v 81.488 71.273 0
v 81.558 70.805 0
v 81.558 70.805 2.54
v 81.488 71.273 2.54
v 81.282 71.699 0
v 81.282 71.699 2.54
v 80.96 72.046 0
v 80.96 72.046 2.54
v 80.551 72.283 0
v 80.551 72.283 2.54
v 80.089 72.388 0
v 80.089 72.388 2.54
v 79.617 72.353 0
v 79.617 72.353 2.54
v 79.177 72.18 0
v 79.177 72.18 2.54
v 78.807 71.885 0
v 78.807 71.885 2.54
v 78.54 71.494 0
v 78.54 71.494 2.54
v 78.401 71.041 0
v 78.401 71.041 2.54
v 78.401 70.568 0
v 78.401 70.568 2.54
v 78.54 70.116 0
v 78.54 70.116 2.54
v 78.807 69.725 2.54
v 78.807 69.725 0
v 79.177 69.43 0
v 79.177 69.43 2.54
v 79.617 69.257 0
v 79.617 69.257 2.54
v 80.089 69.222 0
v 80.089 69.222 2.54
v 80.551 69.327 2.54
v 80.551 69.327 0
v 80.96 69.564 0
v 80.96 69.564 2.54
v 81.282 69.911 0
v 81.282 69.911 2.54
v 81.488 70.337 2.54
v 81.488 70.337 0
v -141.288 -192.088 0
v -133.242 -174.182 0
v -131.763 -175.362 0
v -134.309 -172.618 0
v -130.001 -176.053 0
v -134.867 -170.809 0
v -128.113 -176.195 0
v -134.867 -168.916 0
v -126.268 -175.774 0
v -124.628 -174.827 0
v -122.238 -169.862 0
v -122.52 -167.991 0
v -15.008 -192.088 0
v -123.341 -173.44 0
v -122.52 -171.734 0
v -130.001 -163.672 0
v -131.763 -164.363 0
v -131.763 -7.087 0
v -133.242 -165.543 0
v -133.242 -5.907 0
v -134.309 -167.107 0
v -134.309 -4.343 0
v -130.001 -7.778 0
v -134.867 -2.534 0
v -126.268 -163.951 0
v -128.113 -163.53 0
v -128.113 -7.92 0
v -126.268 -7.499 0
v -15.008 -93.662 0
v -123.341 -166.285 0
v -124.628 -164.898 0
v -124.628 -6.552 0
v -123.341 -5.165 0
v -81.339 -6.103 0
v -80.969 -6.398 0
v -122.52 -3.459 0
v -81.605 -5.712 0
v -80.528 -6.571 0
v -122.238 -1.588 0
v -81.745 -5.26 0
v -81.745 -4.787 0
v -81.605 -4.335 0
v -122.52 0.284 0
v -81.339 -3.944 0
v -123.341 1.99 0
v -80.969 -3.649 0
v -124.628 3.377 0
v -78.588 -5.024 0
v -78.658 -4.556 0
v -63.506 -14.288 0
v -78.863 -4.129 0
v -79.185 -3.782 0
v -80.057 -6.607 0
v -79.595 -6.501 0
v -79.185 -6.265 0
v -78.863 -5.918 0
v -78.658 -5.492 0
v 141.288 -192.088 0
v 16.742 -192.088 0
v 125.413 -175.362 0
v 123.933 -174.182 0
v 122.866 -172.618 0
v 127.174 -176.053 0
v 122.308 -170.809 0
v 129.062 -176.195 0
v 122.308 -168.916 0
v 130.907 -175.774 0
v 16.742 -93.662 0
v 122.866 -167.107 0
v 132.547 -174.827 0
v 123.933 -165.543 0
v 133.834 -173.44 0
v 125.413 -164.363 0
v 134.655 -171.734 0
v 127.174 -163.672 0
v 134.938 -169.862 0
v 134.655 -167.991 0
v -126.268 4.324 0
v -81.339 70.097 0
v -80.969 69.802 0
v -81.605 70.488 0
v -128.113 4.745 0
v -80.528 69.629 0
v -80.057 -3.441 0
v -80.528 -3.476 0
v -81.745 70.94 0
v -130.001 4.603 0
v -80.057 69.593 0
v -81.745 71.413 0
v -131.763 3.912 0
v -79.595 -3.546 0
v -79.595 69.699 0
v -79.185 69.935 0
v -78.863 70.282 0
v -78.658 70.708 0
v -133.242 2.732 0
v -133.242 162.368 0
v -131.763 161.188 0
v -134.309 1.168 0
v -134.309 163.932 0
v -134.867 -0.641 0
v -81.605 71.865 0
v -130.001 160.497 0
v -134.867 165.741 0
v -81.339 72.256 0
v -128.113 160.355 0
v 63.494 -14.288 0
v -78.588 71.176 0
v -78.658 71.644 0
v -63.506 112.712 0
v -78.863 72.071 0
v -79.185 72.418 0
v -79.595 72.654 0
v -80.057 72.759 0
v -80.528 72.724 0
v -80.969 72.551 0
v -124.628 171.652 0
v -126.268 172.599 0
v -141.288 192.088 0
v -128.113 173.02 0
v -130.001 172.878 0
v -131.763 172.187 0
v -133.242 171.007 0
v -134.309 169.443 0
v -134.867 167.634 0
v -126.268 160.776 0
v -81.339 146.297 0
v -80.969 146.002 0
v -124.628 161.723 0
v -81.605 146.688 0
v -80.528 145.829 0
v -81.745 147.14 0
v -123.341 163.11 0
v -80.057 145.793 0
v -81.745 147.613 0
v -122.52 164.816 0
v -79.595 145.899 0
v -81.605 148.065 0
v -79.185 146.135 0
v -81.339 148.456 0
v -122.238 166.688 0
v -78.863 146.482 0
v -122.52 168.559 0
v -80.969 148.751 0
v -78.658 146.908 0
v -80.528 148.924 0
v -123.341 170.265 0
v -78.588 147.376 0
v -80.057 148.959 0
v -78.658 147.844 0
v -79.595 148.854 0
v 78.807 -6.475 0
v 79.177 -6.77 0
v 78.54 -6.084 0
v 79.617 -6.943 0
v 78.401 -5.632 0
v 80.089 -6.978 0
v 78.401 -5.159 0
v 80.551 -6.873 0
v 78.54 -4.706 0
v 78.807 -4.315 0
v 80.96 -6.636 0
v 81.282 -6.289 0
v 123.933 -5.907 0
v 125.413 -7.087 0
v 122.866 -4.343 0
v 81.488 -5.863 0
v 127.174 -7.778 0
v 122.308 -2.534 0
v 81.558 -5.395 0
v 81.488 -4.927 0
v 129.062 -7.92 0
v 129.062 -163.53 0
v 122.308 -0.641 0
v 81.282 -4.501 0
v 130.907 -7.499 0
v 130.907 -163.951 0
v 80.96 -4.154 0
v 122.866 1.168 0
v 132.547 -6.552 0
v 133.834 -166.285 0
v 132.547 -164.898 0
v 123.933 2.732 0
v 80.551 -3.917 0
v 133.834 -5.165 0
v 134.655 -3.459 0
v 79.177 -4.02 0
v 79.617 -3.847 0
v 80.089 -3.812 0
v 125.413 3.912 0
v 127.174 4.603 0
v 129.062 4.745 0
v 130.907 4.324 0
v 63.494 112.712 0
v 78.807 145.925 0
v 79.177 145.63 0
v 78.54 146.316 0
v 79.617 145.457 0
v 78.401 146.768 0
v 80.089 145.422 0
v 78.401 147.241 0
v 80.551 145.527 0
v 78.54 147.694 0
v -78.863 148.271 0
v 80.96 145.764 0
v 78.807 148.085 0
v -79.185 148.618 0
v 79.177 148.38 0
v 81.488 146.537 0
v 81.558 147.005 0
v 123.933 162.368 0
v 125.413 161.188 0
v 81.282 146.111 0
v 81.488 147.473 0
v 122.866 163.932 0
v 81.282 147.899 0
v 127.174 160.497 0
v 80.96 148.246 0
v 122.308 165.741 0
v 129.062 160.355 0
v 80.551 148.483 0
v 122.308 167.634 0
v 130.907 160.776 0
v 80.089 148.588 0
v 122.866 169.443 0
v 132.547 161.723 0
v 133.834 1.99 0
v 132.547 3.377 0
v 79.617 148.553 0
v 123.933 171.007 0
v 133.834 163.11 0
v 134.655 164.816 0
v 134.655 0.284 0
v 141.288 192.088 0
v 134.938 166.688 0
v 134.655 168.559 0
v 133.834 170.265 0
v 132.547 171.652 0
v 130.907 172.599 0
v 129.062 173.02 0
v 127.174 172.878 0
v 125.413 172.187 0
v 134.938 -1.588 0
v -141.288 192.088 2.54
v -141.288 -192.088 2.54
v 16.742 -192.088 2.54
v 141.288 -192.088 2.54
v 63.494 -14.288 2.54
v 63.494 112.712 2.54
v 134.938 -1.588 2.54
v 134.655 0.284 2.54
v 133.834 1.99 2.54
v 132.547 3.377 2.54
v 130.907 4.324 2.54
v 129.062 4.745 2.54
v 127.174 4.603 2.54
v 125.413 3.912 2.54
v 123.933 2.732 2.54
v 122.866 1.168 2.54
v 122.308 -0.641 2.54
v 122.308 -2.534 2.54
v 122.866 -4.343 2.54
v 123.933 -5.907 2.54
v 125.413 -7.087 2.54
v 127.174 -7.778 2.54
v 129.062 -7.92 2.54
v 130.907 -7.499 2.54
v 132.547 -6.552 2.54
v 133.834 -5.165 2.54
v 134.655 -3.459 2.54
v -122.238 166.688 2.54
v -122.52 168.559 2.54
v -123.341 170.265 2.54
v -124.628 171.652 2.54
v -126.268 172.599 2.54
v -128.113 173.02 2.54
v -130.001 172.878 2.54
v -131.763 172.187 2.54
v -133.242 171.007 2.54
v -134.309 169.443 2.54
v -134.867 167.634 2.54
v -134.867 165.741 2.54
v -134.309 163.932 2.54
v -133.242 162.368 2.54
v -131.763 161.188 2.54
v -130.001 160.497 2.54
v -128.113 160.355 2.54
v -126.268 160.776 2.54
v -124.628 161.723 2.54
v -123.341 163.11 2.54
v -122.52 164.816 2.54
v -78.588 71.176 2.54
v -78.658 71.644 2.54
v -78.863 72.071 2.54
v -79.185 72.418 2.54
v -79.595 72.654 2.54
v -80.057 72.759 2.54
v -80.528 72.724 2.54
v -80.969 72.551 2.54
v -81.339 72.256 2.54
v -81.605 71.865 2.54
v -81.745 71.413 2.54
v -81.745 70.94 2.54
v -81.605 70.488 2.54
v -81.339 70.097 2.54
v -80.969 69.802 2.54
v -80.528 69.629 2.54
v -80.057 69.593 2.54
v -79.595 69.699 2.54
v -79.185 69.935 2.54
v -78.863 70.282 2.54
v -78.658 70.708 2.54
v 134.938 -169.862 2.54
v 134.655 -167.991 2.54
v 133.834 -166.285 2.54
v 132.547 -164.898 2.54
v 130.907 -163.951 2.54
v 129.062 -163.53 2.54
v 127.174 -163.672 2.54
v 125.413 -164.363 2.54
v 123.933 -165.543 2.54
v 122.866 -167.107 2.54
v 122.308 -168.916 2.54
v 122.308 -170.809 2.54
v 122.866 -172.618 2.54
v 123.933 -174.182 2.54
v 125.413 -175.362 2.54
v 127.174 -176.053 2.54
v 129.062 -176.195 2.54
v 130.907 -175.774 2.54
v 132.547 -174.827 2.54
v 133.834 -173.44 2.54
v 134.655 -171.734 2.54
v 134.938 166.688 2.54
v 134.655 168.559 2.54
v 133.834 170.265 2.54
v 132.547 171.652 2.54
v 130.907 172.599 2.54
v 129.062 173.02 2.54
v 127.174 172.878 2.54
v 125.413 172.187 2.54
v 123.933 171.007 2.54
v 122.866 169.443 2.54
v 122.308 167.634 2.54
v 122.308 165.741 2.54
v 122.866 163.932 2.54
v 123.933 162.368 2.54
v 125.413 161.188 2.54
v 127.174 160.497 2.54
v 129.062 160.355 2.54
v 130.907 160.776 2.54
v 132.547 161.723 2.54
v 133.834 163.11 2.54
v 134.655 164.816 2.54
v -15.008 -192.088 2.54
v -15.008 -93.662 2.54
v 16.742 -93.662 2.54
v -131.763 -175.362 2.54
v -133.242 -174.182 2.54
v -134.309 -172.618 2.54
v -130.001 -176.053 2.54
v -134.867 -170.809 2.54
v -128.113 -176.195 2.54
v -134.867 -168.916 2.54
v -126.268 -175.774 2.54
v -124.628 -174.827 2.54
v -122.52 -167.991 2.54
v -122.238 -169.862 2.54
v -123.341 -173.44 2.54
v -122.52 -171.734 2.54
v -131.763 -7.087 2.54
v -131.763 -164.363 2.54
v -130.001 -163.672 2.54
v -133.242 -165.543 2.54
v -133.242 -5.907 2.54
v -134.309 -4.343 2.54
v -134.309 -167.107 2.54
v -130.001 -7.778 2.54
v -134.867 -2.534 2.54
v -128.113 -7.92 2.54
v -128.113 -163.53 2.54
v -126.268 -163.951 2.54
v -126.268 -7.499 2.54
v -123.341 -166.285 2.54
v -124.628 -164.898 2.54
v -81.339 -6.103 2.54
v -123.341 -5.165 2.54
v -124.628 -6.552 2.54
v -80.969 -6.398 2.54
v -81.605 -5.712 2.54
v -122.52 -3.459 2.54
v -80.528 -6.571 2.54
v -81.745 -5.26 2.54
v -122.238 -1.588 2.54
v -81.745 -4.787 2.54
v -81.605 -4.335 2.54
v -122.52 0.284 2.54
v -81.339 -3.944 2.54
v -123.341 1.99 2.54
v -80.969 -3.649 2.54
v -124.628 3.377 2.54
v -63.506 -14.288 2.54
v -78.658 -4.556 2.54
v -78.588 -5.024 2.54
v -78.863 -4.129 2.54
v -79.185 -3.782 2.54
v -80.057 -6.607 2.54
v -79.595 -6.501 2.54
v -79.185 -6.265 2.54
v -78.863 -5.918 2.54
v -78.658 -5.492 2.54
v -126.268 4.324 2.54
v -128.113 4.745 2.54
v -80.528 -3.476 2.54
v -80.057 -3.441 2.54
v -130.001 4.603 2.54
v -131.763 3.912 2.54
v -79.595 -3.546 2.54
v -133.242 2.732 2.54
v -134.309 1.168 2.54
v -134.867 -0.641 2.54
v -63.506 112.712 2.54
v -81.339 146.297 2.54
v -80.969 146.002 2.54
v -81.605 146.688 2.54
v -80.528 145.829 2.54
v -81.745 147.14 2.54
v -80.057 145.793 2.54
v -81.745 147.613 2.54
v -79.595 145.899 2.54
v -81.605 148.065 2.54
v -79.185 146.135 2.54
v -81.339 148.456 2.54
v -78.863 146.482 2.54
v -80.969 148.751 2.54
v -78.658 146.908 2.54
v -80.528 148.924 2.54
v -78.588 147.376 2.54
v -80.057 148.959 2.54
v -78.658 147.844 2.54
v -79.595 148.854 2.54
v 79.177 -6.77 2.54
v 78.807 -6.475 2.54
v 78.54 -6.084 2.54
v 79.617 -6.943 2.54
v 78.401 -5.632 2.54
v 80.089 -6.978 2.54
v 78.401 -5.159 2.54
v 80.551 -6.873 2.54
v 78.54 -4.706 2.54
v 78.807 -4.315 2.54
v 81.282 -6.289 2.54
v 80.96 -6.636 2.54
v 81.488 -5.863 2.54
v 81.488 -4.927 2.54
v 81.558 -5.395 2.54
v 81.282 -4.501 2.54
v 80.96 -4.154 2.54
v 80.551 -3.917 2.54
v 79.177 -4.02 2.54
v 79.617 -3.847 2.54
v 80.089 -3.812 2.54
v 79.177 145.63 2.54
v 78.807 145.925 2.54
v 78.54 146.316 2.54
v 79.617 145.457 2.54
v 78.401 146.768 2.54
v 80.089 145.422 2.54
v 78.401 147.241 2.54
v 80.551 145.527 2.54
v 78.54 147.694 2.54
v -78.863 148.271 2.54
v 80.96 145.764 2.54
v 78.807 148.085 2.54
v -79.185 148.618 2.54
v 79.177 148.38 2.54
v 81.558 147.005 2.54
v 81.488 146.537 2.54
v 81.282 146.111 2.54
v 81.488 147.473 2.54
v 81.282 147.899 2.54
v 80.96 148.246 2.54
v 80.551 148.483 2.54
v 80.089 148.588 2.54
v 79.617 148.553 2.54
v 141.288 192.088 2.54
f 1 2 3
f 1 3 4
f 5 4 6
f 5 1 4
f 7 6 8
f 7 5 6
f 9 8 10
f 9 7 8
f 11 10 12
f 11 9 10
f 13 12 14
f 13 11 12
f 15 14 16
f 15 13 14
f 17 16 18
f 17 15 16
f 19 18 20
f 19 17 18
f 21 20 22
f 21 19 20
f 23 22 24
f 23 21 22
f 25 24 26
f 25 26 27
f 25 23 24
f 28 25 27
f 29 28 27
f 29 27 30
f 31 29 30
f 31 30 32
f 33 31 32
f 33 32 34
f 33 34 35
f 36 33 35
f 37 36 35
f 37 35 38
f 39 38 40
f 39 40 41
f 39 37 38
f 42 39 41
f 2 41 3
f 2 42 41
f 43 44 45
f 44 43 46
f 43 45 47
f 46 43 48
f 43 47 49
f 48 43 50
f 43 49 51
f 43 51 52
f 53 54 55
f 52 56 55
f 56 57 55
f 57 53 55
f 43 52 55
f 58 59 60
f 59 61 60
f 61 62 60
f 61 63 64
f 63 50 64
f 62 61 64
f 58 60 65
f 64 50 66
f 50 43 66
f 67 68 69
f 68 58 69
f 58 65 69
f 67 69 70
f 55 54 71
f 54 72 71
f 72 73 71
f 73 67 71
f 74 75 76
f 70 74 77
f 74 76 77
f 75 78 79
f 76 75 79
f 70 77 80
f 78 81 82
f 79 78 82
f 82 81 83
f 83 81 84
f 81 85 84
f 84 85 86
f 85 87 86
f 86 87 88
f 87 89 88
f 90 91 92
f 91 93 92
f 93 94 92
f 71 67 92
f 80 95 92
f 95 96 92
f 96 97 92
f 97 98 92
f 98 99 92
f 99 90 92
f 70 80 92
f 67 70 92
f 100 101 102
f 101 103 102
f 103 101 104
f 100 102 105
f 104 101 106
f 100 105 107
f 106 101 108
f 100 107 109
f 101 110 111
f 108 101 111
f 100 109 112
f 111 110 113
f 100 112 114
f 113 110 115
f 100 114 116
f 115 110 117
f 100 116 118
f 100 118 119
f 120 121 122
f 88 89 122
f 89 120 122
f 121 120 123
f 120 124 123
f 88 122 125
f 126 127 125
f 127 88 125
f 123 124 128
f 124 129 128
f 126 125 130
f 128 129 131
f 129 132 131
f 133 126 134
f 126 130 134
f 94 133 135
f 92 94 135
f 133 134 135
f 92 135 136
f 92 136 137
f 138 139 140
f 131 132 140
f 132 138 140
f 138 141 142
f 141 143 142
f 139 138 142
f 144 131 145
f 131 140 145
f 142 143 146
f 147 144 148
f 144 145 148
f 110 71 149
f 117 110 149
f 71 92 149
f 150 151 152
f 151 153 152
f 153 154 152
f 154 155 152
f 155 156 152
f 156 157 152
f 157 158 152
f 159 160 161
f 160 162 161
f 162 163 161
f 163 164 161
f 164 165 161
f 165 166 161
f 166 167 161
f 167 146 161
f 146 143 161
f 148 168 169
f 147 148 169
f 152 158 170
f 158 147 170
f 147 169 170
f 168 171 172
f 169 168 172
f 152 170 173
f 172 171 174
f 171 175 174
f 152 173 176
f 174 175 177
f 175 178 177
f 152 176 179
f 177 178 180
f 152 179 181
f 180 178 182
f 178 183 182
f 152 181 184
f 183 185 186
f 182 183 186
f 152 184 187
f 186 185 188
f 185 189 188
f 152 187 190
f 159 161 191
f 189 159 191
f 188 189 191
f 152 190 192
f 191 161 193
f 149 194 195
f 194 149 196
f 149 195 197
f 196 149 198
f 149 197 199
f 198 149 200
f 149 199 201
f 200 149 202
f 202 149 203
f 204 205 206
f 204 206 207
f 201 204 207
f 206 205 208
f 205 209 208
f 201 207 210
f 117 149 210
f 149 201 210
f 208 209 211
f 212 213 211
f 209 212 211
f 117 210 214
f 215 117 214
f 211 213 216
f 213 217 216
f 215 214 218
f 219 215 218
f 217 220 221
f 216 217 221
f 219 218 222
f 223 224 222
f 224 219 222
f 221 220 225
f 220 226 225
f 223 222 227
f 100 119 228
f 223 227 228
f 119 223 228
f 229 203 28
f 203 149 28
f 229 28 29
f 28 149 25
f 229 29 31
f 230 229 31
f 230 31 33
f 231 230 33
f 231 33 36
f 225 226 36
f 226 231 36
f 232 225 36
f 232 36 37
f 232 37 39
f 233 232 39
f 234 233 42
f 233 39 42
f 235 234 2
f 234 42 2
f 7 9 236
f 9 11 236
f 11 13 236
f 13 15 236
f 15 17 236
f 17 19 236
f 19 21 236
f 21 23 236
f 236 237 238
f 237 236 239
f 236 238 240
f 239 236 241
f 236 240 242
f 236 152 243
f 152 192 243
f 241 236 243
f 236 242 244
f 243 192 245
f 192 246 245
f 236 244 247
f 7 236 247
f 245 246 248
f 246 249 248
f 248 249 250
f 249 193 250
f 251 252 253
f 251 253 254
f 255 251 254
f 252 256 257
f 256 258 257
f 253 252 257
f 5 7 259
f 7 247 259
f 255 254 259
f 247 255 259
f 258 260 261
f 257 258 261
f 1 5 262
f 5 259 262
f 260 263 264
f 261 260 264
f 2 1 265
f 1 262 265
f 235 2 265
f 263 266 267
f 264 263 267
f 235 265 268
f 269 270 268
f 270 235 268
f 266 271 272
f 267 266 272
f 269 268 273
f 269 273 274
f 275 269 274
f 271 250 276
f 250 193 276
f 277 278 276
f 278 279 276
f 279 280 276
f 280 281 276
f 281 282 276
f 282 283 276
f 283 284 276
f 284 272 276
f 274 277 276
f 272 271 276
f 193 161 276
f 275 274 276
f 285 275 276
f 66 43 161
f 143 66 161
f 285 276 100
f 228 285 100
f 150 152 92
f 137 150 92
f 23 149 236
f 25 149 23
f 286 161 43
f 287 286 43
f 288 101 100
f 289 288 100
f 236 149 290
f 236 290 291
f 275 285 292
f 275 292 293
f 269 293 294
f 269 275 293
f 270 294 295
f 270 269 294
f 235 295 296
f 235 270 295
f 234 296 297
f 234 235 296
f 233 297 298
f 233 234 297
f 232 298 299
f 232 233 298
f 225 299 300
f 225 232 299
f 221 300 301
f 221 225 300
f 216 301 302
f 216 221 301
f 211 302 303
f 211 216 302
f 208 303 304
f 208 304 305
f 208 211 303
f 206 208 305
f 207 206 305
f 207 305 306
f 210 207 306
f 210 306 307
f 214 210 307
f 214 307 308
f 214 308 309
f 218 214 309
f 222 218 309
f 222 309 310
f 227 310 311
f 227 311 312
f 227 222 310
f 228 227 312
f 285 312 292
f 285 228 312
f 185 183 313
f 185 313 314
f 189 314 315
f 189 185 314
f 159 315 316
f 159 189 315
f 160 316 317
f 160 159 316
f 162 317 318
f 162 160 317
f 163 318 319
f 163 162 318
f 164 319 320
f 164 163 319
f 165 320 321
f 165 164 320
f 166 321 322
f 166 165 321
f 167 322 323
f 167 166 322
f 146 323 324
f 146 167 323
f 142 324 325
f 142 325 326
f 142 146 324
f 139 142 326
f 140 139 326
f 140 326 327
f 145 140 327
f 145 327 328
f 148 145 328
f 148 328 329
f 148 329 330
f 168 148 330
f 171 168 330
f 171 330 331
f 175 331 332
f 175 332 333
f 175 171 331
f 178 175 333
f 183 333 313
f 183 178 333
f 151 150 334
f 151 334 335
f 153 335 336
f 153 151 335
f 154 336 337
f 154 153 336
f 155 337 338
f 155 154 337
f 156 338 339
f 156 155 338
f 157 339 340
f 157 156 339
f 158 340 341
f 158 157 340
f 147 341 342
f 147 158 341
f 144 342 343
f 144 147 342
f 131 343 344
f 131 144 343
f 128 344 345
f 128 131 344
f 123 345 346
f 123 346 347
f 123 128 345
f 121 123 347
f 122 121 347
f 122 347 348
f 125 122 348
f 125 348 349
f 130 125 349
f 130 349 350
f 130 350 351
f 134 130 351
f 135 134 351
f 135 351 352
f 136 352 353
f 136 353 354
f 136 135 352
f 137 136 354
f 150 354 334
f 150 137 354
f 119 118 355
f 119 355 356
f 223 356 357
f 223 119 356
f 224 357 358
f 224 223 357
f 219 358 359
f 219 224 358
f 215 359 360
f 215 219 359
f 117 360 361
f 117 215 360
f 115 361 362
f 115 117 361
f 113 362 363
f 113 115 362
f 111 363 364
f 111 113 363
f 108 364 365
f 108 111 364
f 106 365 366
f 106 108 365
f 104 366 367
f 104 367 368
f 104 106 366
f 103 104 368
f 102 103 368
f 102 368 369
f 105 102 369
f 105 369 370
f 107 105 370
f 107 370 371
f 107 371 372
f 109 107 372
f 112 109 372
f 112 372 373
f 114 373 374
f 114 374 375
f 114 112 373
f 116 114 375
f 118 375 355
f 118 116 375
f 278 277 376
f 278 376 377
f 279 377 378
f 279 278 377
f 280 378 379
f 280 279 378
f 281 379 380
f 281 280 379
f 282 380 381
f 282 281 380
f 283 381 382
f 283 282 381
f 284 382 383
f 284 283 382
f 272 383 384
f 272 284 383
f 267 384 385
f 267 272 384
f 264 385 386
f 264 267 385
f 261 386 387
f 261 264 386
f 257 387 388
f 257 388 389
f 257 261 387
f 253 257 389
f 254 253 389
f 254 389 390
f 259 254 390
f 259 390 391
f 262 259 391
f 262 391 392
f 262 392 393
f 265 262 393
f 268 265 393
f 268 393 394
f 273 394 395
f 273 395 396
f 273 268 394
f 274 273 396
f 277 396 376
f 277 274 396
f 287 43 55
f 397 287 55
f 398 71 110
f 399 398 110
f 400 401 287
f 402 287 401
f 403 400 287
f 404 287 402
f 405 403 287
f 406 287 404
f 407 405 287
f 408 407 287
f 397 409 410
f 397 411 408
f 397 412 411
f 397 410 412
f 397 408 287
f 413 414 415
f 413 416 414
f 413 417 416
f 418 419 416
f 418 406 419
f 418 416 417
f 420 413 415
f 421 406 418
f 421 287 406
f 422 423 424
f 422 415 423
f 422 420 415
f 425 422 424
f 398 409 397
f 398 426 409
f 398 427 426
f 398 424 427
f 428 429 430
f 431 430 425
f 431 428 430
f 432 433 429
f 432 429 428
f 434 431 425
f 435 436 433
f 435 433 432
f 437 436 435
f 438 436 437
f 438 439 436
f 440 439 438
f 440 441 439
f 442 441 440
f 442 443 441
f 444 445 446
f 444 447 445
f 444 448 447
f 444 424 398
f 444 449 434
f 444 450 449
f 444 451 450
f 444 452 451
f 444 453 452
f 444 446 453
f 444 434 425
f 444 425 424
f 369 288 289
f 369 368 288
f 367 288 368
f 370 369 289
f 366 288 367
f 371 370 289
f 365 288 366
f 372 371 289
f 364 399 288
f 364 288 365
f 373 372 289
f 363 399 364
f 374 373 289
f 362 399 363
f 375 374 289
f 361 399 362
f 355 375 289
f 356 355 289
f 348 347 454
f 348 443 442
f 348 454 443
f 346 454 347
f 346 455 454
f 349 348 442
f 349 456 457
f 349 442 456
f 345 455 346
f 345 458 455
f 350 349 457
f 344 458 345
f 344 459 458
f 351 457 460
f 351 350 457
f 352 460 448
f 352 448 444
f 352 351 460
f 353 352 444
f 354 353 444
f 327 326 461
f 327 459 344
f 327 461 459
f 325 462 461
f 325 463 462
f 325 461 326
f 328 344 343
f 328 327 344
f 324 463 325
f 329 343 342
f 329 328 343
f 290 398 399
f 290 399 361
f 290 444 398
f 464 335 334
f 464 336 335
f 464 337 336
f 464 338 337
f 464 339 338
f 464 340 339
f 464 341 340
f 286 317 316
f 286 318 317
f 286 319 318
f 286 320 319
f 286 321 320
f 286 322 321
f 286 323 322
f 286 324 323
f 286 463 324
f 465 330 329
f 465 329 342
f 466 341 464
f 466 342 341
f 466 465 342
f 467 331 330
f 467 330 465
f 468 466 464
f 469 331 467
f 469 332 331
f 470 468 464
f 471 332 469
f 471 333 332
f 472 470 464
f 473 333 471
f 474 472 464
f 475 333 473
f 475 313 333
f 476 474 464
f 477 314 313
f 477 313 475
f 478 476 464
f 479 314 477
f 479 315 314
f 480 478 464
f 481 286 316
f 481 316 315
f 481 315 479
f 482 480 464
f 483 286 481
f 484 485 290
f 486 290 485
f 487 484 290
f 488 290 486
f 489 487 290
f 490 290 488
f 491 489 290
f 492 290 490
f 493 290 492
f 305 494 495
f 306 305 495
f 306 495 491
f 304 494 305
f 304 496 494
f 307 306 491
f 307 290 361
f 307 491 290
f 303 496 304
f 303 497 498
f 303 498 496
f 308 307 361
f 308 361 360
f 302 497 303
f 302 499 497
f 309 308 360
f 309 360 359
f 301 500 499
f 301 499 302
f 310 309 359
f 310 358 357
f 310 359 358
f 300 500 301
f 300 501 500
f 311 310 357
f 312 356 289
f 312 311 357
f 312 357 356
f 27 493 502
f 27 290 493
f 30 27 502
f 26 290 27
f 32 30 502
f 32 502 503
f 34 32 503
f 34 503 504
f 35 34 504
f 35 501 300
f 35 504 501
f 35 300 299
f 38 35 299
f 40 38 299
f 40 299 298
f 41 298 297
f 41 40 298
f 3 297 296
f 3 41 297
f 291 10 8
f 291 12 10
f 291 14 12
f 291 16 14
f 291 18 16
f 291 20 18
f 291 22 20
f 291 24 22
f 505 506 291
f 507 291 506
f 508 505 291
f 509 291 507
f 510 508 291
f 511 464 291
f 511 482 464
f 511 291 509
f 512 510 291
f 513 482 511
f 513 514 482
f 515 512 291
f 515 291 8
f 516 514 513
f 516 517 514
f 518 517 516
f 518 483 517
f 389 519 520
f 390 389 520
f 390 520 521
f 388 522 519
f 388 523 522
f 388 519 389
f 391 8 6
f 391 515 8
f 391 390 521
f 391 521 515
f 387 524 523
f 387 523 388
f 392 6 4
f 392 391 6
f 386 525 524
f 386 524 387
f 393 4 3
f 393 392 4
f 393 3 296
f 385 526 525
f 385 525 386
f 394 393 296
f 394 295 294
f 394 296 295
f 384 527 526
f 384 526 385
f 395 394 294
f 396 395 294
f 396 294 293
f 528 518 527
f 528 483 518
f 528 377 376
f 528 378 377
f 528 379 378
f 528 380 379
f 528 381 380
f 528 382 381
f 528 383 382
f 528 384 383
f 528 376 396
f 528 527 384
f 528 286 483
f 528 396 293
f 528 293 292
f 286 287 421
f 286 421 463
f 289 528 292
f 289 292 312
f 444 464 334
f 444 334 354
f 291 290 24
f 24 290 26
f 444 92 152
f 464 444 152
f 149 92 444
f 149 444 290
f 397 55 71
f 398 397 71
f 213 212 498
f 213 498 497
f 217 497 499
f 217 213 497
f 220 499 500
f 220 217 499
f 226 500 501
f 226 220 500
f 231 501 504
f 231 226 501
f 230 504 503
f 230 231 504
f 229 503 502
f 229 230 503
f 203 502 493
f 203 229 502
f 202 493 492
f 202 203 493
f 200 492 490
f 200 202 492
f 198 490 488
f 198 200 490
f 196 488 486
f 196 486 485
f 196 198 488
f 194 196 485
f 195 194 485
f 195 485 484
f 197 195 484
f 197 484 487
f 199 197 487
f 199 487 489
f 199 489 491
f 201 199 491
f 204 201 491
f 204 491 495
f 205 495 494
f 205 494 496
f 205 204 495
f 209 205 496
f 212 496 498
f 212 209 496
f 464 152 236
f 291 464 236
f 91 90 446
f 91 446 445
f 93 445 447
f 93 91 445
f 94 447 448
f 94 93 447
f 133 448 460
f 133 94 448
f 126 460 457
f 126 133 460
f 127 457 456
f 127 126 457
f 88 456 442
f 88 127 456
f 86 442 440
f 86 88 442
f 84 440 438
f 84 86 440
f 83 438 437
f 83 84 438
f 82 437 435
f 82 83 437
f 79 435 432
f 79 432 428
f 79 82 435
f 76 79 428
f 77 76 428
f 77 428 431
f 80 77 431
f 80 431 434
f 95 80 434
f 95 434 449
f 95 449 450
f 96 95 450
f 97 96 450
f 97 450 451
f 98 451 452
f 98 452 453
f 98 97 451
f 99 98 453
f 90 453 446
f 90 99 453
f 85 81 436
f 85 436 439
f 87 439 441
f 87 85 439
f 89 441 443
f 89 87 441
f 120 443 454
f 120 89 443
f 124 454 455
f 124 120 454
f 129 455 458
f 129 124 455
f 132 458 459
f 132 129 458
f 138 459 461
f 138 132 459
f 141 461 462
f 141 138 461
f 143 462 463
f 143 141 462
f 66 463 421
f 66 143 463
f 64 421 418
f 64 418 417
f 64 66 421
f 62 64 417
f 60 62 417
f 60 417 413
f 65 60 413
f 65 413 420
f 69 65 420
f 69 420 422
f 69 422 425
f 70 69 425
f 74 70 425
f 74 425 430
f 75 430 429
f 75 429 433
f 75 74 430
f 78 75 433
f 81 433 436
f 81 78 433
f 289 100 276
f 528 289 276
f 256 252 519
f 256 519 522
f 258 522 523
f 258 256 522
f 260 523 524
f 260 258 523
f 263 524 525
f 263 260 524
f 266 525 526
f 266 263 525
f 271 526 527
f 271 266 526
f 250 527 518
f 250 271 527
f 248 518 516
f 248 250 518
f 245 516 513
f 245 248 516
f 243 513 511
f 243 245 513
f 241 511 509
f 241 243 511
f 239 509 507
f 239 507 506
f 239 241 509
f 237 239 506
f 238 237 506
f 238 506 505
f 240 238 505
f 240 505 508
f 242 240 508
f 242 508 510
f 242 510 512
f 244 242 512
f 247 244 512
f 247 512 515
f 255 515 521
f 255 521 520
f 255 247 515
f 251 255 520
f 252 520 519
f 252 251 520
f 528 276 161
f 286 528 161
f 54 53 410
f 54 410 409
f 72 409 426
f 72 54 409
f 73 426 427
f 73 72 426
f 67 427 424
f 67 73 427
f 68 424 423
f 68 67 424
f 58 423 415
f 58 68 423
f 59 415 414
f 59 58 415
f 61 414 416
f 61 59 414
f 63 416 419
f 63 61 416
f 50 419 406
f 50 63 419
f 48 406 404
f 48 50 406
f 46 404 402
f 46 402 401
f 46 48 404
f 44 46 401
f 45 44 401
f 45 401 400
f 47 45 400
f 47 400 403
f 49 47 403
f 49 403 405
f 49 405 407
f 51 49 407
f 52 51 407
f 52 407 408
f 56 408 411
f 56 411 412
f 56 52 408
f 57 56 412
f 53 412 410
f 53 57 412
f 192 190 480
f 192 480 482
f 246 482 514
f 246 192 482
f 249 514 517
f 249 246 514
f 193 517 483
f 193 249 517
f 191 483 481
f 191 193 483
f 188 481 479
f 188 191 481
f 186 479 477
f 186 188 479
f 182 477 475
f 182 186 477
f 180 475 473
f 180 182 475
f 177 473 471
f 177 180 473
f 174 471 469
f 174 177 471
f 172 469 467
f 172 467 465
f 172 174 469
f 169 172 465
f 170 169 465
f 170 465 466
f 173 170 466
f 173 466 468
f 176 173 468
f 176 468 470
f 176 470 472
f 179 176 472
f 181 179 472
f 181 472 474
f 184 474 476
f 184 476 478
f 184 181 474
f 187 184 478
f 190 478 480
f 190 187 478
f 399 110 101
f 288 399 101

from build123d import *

# Parameters (mm, degrees)
SKETCH1_R           = 6.35
SKETCH1_R_2         = 1.5875
SKETCH1_W           = 127
SKETCH1_H           = 127
BOSS_EXTRUDE1_DEPTH = 2.54


with BuildPart() as part:
    # Sketch1 → Boss-Extrude1 (new body)
    with BuildSketch(Plane.XY):
        Polygon((141.2875, 192.0875), (-141.2875, 192.0875), (-141.2875, -192.0875), (-15.008193375, -192.0875), (-15.008193375, -93.6625), (16.741806625, -93.6625), (16.741806625, -192.0875), (141.2875, -192.0875), align=None)
        with Locations((-128.5875, -169.8625)):
            Circle(SKETCH1_R, mode=Mode.SUBTRACT)
        with Locations((-128.5875, -1.5875)):
            Circle(SKETCH1_R, mode=Mode.SUBTRACT)
        with Locations((-80.175152311, -5.023613243)):
            Circle(SKETCH1_R_2, mode=Mode.SUBTRACT)
        with Locations((128.5875, -169.8625)):
            Circle(SKETCH1_R, mode=Mode.SUBTRACT)
        with Locations((79.970650499, -5.395164494)):
            Circle(SKETCH1_R_2, mode=Mode.SUBTRACT)
        with Locations((128.5875, -1.5875)):
            Circle(SKETCH1_R, mode=Mode.SUBTRACT)
        with Locations((-80.175152311, 71.176386757)):
            Circle(SKETCH1_R_2, mode=Mode.SUBTRACT)
        with Locations((-0.006402311, 49.2125)):
            Rectangle(SKETCH1_W, SKETCH1_H, mode=Mode.SUBTRACT)
        with Locations((-128.5875, 166.6875)):
            Circle(SKETCH1_R, mode=Mode.SUBTRACT)
        with Locations((-80.175152311, 147.376386757)):
            Circle(SKETCH1_R_2, mode=Mode.SUBTRACT)
        with Locations((79.970650499, 70.804835506)):
            Circle(SKETCH1_R_2, mode=Mode.SUBTRACT)
        with Locations((79.970650499, 147.004835506)):
            Circle(SKETCH1_R_2, mode=Mode.SUBTRACT)
        with Locations((128.5875, 166.6875)):
            Circle(SKETCH1_R, mode=Mode.SUBTRACT)
    extrude(amount=BOSS_EXTRUDE1_DEPTH)


solid = part.part
